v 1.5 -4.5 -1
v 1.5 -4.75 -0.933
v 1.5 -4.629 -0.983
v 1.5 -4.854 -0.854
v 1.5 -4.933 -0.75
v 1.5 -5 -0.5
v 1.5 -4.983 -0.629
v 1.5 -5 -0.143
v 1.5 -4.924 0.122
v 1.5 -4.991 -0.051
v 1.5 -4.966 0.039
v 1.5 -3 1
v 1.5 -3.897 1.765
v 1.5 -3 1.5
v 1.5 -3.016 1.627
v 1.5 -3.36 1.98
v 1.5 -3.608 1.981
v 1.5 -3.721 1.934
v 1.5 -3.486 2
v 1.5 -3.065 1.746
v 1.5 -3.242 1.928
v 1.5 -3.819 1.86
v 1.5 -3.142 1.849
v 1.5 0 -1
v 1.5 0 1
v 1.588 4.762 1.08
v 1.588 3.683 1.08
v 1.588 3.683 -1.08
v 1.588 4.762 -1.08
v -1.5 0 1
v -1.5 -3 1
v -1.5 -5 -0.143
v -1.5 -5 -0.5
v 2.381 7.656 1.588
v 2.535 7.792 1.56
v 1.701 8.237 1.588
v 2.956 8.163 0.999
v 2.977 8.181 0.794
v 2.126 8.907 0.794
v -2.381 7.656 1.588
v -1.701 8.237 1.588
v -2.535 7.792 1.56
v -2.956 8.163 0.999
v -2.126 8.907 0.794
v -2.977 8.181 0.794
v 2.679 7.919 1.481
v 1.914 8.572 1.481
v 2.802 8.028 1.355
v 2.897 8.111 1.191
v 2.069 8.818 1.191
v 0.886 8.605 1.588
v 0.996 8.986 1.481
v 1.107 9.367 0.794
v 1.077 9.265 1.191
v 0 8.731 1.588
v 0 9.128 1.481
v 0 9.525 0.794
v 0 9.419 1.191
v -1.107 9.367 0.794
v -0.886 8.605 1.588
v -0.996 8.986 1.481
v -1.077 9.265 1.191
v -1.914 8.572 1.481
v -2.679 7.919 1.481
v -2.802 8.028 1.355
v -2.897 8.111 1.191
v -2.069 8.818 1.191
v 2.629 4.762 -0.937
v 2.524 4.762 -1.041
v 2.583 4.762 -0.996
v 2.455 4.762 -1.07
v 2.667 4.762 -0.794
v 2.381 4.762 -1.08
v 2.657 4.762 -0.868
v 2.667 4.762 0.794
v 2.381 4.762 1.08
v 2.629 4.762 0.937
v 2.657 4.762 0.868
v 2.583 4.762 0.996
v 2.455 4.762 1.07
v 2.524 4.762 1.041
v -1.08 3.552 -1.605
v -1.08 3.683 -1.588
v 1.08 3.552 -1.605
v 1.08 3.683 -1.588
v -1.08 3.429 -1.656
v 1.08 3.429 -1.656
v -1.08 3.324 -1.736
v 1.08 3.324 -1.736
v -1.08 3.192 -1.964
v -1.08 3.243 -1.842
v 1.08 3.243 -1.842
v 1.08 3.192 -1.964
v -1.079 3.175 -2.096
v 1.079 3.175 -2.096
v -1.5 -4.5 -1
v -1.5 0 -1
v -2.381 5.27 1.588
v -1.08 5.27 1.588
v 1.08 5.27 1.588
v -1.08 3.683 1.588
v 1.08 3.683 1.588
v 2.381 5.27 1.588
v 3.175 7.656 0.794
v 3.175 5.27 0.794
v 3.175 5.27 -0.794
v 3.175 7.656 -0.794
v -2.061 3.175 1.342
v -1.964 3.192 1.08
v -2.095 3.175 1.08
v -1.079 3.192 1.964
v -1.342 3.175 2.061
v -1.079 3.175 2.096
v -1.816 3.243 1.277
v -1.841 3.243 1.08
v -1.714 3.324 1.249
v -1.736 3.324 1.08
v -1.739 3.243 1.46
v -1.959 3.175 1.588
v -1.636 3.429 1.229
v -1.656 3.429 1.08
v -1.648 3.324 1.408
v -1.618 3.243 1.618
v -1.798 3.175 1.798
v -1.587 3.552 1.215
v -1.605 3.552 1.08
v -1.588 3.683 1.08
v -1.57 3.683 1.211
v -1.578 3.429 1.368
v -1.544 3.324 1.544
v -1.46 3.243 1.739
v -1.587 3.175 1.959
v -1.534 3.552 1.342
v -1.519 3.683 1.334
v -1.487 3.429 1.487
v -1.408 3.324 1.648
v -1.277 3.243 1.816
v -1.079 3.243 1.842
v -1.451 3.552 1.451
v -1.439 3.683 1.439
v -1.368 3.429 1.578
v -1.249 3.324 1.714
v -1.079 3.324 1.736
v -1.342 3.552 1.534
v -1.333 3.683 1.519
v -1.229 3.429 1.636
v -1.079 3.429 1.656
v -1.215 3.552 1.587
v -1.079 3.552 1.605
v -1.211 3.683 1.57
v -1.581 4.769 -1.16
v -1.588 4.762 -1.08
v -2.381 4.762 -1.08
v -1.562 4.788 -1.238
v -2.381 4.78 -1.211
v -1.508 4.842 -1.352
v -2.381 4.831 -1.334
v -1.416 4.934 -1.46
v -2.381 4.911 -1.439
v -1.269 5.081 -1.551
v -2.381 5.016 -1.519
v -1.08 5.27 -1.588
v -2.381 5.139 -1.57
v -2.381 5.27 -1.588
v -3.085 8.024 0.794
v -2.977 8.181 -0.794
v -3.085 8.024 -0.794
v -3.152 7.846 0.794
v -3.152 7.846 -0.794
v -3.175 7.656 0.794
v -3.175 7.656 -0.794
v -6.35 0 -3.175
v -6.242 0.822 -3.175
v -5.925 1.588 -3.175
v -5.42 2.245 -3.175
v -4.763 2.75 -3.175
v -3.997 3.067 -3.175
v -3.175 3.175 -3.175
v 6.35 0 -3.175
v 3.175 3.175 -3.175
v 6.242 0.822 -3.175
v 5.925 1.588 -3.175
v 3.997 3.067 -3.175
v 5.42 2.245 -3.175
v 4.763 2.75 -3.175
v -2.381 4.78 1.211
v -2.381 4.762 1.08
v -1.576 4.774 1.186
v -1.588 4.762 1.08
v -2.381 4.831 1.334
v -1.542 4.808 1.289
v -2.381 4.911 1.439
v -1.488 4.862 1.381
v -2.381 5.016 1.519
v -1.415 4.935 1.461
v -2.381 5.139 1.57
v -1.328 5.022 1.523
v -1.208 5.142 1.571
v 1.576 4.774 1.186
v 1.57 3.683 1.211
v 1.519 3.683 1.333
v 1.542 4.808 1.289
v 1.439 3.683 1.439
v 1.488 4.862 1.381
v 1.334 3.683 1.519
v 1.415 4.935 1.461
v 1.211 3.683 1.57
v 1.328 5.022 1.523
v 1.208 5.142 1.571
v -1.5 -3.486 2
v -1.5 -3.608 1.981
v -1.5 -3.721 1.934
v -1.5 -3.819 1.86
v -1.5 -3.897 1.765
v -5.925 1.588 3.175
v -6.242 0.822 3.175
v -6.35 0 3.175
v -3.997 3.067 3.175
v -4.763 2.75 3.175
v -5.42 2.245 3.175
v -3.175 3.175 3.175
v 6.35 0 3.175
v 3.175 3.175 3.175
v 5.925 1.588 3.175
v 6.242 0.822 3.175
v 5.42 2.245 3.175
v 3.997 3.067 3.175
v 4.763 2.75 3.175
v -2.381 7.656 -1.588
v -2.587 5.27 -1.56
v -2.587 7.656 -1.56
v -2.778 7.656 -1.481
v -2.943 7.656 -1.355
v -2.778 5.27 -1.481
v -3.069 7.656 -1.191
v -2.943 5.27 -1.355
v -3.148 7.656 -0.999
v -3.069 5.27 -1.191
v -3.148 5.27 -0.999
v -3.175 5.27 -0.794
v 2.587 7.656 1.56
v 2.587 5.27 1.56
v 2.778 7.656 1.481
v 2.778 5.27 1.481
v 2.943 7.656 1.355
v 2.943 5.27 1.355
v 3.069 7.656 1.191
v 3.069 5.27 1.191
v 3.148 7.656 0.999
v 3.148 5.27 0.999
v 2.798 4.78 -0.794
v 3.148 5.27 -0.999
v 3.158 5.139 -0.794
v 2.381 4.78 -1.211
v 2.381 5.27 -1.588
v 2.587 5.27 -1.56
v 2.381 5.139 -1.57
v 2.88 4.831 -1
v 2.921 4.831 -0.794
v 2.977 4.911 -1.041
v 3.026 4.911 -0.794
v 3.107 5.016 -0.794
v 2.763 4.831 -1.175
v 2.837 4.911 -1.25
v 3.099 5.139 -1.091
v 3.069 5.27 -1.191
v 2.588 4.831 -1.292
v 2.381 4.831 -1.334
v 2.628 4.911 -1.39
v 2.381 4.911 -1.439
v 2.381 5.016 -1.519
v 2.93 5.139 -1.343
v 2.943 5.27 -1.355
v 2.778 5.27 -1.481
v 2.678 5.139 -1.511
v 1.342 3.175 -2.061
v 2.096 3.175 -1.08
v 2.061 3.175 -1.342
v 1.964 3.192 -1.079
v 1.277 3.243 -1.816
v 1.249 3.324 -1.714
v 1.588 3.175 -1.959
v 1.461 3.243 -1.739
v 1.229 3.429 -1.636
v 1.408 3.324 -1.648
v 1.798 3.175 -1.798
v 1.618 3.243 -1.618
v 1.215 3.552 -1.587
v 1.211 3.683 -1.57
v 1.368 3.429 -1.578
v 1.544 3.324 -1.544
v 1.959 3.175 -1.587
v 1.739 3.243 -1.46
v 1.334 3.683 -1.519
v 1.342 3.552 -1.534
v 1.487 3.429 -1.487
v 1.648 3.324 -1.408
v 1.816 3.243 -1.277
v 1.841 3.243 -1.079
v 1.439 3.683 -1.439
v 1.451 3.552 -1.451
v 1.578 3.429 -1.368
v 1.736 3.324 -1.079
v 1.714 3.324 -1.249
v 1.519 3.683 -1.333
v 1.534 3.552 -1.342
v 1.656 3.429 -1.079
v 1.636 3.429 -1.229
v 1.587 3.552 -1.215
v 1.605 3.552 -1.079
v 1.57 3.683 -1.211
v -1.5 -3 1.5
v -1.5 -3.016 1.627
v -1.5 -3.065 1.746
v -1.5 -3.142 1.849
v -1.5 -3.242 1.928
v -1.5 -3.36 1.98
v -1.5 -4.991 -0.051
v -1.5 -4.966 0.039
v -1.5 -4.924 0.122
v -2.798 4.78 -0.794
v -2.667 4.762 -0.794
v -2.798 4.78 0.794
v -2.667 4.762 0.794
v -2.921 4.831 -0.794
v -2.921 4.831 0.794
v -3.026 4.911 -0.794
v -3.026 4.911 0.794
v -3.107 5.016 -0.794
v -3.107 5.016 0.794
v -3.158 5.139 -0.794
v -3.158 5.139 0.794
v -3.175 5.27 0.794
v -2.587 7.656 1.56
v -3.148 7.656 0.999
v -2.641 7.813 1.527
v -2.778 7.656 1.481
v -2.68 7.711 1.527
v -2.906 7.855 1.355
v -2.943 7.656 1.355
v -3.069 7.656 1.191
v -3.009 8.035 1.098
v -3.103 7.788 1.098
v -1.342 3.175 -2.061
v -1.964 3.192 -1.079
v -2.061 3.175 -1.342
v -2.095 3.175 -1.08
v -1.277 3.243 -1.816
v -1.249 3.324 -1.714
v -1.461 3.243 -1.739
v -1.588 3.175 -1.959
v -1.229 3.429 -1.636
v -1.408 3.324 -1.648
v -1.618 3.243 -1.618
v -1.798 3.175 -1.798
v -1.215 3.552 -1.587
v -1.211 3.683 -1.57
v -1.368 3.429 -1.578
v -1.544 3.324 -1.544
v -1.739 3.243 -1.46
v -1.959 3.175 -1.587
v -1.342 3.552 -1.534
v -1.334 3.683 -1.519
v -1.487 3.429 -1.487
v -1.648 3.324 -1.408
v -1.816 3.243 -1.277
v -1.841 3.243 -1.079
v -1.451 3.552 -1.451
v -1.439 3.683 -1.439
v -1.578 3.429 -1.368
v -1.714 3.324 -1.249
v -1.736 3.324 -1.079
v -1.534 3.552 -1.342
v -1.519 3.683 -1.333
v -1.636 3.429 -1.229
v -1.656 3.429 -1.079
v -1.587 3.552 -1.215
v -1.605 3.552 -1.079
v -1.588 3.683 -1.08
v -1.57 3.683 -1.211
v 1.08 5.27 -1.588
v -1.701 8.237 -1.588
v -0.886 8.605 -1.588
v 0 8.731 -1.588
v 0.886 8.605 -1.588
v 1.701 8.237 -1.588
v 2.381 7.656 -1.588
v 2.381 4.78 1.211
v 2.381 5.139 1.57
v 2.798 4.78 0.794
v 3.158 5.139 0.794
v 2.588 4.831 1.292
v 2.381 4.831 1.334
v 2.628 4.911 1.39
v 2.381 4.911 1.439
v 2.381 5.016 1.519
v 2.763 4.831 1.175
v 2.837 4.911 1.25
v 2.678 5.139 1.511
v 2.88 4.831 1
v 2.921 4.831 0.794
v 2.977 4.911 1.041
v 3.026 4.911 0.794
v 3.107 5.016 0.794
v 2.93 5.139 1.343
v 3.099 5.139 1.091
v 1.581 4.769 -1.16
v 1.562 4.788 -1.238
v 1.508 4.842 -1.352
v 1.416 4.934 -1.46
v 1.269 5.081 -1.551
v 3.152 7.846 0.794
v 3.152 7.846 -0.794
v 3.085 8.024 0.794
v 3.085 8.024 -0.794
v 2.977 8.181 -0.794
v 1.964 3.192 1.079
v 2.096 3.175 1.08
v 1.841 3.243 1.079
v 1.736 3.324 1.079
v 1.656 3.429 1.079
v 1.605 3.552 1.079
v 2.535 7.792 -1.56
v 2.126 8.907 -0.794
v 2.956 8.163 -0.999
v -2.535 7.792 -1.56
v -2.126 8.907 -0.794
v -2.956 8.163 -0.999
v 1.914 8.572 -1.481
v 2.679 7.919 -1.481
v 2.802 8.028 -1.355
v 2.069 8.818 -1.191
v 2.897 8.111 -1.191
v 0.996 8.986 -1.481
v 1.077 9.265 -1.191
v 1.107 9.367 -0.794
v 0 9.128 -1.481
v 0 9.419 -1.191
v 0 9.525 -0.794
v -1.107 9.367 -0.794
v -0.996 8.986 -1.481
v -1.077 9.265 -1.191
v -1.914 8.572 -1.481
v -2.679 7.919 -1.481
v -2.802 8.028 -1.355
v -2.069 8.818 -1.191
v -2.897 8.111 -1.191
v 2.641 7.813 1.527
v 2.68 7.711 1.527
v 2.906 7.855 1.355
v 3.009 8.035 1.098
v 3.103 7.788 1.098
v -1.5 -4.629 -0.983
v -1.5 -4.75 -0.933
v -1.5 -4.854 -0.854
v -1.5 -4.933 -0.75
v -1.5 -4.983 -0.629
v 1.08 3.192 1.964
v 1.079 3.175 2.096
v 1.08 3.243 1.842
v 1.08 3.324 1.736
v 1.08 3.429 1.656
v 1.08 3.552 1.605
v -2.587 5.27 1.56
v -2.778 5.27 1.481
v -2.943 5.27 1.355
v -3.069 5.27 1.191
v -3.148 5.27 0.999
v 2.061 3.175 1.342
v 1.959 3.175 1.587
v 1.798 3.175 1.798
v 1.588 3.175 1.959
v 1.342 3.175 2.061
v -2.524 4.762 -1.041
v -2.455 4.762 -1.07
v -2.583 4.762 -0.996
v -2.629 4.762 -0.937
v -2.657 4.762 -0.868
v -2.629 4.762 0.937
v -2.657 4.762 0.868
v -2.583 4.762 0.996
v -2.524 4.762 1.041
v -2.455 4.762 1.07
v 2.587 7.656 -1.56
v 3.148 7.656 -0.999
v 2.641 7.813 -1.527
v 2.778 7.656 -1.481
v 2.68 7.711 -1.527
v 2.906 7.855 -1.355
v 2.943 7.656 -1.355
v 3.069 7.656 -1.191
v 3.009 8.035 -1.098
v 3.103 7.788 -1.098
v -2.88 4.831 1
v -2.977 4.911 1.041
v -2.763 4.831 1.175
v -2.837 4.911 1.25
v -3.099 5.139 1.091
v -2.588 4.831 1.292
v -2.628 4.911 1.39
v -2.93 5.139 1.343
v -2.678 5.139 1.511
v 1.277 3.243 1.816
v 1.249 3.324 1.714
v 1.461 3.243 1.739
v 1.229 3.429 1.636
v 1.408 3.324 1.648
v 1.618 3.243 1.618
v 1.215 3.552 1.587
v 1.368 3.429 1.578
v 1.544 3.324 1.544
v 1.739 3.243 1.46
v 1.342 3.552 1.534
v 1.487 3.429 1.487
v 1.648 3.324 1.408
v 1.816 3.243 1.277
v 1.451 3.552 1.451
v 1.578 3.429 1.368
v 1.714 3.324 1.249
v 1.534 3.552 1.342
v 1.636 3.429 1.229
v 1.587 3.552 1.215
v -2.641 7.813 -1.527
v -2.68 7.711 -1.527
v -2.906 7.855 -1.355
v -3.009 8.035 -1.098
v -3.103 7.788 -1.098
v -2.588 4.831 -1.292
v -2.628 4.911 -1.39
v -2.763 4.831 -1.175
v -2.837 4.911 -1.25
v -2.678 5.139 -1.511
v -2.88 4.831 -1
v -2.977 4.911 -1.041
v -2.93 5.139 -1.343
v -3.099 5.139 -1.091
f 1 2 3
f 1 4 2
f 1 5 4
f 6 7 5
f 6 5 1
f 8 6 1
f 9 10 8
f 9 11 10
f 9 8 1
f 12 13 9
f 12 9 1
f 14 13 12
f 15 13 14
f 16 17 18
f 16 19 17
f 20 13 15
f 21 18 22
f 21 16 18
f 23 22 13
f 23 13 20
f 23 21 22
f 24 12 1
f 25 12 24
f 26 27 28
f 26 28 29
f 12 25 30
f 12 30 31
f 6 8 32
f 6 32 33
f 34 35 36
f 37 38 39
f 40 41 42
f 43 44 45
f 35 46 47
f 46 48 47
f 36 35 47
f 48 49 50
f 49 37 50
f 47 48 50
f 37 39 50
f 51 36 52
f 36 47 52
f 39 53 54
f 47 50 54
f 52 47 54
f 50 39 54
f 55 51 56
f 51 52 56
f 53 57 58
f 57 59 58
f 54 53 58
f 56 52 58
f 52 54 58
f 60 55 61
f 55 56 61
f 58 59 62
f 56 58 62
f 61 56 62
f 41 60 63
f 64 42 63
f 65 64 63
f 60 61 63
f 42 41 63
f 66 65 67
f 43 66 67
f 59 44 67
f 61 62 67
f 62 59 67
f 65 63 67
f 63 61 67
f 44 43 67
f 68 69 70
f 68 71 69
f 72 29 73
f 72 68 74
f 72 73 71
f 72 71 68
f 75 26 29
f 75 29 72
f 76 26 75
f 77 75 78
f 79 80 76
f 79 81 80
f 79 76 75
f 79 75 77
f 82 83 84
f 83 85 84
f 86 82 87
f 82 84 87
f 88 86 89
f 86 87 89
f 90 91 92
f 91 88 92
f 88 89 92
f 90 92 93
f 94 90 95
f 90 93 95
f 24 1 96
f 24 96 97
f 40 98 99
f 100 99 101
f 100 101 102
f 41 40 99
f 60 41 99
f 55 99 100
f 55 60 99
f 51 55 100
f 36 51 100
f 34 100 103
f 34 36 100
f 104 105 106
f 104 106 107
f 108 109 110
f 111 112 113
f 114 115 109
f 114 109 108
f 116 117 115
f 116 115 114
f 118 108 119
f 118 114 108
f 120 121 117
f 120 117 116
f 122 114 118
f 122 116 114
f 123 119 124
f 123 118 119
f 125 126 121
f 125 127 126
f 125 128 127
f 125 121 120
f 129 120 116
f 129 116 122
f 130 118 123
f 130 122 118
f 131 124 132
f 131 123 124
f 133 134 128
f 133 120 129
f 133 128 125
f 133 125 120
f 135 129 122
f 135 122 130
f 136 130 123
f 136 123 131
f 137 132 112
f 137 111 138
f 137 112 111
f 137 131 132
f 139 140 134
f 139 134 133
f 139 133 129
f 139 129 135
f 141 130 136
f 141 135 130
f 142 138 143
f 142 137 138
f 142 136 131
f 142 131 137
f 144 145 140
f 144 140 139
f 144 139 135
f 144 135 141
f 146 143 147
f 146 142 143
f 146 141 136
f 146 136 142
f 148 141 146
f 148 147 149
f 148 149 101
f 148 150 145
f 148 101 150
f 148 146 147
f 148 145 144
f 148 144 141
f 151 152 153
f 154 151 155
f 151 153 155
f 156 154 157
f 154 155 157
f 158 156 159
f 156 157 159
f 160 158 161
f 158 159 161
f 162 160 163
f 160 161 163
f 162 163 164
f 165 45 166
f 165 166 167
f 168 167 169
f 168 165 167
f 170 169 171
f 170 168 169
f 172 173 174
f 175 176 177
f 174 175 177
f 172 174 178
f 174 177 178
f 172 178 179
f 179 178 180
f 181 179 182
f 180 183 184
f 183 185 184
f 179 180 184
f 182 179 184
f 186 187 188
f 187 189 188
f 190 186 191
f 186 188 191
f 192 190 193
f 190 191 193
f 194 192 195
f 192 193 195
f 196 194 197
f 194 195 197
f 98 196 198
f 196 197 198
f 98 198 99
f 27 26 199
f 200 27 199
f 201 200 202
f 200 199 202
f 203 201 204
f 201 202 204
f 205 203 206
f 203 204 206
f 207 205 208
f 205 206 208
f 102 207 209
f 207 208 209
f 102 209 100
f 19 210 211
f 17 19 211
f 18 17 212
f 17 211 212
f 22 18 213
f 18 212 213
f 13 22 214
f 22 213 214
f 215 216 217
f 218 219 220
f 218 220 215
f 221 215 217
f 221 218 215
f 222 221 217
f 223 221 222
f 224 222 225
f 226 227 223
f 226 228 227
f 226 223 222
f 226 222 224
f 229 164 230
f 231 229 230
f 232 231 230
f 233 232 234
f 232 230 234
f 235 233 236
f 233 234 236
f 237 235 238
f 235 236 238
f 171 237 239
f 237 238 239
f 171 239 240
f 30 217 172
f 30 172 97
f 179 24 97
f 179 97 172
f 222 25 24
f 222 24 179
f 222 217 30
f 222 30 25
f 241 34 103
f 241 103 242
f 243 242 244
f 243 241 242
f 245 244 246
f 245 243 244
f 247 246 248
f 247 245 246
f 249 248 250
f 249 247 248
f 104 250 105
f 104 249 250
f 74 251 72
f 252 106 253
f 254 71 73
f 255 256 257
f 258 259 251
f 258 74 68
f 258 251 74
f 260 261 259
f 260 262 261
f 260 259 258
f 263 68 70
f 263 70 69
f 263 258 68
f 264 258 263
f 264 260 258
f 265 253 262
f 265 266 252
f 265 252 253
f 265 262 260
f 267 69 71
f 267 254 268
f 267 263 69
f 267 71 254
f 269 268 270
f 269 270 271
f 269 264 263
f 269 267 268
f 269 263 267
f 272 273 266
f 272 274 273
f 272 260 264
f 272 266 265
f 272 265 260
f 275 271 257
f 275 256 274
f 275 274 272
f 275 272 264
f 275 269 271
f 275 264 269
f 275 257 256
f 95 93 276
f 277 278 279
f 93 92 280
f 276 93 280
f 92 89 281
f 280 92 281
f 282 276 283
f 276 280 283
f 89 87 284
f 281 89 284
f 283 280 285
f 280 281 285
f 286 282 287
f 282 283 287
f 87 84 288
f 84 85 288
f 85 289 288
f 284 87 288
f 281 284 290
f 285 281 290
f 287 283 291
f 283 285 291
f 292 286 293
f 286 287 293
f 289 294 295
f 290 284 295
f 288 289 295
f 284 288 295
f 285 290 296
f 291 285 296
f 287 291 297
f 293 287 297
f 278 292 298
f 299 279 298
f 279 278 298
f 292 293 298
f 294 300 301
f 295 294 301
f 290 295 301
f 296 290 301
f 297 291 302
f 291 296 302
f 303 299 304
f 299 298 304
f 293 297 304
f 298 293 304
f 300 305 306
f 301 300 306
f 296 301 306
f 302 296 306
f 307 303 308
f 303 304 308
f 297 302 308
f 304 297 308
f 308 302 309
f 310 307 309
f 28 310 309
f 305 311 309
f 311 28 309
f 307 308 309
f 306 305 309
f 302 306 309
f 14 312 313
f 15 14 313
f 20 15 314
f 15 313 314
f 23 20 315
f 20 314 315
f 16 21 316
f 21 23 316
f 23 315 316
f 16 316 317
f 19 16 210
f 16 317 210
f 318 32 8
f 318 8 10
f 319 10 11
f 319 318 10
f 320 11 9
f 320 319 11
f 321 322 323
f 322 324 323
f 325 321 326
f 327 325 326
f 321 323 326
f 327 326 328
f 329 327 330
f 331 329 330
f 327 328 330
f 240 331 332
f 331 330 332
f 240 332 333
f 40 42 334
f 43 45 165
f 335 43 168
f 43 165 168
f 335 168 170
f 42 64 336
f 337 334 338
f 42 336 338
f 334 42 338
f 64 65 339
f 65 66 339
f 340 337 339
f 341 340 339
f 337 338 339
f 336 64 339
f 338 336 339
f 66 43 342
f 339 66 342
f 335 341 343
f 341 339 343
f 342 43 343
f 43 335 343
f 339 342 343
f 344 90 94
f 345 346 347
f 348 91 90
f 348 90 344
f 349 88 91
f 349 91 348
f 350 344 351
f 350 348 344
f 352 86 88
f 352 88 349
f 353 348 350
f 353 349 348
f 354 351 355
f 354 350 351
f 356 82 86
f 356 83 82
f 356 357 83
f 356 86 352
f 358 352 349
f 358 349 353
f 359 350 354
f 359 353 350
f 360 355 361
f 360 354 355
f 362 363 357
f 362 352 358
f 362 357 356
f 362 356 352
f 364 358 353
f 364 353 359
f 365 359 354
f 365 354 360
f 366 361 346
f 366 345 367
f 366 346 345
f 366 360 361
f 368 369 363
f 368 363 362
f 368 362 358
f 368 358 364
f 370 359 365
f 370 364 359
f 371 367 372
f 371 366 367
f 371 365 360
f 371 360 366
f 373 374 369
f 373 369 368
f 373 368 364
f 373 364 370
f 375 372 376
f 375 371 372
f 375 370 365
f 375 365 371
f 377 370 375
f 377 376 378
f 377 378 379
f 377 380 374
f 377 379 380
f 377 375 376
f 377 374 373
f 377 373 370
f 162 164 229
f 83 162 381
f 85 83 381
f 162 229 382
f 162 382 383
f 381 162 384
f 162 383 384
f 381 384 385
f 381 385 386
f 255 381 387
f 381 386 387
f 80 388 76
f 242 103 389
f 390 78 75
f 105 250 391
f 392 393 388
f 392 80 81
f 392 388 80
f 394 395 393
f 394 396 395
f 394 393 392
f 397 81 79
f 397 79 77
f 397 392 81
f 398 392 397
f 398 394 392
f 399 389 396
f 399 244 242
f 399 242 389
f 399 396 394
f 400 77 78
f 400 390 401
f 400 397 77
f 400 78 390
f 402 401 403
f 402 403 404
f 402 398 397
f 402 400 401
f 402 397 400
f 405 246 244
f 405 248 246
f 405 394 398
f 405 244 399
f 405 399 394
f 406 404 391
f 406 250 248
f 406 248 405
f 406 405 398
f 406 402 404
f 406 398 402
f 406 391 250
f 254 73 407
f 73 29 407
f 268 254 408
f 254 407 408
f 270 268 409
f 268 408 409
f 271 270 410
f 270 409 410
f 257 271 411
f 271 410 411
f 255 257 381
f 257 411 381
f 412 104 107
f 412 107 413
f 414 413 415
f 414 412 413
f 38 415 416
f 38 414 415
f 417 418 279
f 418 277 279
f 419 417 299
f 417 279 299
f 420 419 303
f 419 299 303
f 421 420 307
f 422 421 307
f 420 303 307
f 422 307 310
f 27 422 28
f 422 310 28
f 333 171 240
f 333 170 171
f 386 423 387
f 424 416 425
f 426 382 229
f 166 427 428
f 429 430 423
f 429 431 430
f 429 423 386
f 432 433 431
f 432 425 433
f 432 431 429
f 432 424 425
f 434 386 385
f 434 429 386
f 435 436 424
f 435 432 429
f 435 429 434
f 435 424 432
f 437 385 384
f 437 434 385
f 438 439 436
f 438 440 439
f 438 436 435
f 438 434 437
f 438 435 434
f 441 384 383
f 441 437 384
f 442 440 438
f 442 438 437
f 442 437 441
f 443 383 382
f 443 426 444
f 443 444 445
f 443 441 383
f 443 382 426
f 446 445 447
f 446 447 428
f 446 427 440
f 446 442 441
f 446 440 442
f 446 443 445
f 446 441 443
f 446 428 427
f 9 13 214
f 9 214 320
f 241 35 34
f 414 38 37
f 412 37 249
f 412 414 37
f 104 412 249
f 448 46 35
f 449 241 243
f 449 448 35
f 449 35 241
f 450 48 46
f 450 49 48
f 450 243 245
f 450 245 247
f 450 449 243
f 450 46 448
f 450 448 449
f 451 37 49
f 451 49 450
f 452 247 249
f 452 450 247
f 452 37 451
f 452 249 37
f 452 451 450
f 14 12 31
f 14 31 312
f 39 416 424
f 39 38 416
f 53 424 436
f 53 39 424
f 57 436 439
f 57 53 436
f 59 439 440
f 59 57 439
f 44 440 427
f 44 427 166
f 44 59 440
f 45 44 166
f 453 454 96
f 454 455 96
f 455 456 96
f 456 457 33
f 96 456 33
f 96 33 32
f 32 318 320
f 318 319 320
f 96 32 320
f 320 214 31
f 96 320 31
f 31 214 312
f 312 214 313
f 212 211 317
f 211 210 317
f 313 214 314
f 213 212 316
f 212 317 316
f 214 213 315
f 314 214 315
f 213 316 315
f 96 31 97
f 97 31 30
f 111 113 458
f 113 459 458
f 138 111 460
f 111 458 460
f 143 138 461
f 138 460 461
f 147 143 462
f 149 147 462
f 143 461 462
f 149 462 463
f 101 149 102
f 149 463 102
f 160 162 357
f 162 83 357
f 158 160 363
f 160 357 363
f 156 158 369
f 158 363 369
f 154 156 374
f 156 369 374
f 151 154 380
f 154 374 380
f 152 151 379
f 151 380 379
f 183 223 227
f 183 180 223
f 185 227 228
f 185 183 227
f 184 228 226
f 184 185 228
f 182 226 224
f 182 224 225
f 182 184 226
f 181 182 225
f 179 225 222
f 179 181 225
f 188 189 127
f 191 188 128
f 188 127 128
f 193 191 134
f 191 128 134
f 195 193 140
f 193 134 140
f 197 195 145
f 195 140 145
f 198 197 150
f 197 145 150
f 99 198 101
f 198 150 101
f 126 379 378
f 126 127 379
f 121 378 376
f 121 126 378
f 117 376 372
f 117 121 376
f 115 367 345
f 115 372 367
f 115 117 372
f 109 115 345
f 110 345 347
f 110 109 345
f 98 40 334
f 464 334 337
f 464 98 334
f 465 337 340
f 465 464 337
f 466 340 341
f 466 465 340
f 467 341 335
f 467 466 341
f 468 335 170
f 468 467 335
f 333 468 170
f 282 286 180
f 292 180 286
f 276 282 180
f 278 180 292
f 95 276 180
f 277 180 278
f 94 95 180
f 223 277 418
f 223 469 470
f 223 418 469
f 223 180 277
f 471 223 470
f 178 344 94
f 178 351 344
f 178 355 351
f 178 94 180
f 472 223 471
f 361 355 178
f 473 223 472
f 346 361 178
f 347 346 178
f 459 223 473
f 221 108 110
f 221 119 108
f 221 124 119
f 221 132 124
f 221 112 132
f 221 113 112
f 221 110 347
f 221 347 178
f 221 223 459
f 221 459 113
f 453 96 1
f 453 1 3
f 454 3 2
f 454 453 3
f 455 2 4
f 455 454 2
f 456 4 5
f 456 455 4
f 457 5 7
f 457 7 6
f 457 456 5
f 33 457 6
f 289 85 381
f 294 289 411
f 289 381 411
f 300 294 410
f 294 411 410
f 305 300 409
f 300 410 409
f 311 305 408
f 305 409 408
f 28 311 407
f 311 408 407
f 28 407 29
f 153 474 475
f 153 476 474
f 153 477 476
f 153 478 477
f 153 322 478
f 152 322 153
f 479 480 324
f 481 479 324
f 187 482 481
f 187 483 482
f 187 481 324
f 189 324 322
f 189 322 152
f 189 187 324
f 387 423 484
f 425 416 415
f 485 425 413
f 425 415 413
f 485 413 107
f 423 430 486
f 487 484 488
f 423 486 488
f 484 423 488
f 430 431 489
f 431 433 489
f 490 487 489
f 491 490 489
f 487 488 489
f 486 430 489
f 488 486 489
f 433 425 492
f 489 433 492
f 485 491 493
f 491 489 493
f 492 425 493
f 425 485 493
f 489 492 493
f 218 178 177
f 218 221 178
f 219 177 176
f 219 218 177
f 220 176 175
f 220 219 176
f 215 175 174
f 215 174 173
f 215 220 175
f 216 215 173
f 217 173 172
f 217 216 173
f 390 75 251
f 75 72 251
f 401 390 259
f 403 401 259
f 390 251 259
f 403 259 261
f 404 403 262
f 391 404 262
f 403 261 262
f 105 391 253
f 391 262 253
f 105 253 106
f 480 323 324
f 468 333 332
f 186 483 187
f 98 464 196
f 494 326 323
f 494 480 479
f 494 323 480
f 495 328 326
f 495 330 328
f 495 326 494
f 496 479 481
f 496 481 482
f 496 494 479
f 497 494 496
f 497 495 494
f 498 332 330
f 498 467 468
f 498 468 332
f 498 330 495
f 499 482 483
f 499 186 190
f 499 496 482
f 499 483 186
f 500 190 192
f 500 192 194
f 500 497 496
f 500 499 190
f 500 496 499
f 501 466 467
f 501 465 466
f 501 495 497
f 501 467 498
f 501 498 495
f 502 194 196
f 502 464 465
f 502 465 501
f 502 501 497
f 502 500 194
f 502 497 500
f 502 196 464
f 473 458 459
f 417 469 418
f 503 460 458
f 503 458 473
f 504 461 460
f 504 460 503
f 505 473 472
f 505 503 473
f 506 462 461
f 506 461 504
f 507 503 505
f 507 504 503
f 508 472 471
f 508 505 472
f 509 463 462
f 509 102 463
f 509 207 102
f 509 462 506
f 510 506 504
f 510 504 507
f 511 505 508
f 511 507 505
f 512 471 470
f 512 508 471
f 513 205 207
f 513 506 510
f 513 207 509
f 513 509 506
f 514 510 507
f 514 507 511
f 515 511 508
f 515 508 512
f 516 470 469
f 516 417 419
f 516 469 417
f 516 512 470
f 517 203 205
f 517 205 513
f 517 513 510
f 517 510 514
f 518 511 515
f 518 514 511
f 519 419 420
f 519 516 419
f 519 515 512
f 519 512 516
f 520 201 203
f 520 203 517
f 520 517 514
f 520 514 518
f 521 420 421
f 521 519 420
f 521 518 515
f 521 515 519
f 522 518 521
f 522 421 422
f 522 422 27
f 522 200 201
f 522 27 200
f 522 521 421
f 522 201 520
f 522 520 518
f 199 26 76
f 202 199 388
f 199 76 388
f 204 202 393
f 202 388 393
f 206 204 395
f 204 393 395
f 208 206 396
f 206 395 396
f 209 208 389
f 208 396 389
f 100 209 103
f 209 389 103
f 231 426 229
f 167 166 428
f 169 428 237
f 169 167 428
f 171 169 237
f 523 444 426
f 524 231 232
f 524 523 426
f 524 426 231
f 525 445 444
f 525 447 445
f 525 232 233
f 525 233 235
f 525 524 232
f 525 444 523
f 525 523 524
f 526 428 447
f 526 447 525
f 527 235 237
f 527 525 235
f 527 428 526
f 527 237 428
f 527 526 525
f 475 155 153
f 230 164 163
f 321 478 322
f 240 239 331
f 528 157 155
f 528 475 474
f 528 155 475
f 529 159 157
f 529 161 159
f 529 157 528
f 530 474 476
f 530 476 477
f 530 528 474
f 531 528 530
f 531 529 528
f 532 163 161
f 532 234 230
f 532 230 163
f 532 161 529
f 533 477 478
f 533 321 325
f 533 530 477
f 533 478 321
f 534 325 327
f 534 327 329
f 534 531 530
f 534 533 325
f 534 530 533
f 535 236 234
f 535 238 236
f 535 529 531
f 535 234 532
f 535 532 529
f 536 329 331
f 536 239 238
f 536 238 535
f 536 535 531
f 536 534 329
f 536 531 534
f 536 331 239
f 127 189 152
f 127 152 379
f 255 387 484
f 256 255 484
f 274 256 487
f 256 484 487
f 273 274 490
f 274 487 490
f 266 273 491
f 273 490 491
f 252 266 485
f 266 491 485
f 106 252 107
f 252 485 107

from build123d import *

# Parameters (mm, degrees)
F1_DEPTH    = 1.5875
F2_DEPTH    = 3.175
F3_R        = 3.17499
F4_R        = 0.79375
F5_R        = 0.508
F7_DEPTH    = 1.5
F8_T1_DEPTH = 5.5
F8_T3_DEPTH = 3.716990566
F8_T5_DEPTH = 4.3856191038


# Not quite as in the source:
# - a fillet or chamfer that OpenCascade refuses, or shapes differently, is made with other operations: its cross-section is extruded or revolved along the edge and cut away or added
# - a fillet or chamfer is up to 0.001 mm smaller than in the source, because OpenCascade refuses the exact size


with BuildPart() as f1:
    # F0 (on Top) → F1 (new body, symmetric)
    with BuildSketch(Plane.XY):
        with BuildLine():
            Line((3.175, 4.7625), (3.175, 7.9375))
            ThreePointArc((3.175, 7.9375), (0, 9.525), (-3.175, 7.9375))
            Line((-3.175, 7.9375), (-3.175, 4.7625))
            Line((-3.175, 4.7625), (-1.5875, 4.7625))
            Line((-1.5875, 4.7625), (-1.5875, 3.175))
            Line((-1.5875, 3.175), (1.5875, 3.175))
            Line((1.5875, 3.175), (1.5875, 4.7625))
            Line((1.5875, 4.7625), (3.175, 4.7625))
        make_face()
    extrude(amount=F1_DEPTH, both=True)

    # F0 (on Top) → F2 (join, symmetric)
    with BuildSketch(Plane.XY):
        Polygon((6.35, 3.175), (1.5875, 3.175), (-1.5875, 3.175), (-6.35, 3.175), (-6.35, 0), (6.35, 0), align=None)
    extrude(amount=F2_DEPTH, both=True)

    # F3 (radius 3.175 in the source; OpenCascade refuses exactly that, so slightly less here)
    f3_edges = [f1.edges().sort_by_distance(p)[0] for p in [
        (6.35, 3.175, 0),
        (-6.35, 3.175, 0),
    ]]
    fillet(f3_edges, radius=F3_R)

    # F4
    f4_edges = [f1.edges().sort_by_distance(p)[0] for p in [
        (0, 9.525, -1.5875),
        (0, 9.525, 1.5875),
        (3.175, 6.35, -1.5875),
        (3.175, 6.35, 1.5875),
        (-3.175, 6.35, -1.5875),
        (-3.175, 6.35, 1.5875),
        (3.175, 7.9375, 0),
        (-3.175, 7.9375, 0),
    ]]
    fillet(f4_edges, radius=F4_R)

    # F5
    f5_edges = [f1.edges().sort_by_distance(p)[0] for p in [
        (0, 3.175, -1.5875),
        (-1.5875, 3.175, 0),
        (0, 3.175, 1.5875),
        (1.5875, 3.175, 0),
        (1.5875, 3.96875, 1.5875),
        (1.5875, 3.96875, -1.5875),
        (-1.5875, 3.96875, -1.5875),
        (-1.5875, 3.96875, 1.5875),
        (2.942516, 4.7625, 1.355016),
        (-2.942516, 4.7625, -1.355016),
        (1.984375, 4.7625, -1.5875),
        (-1.984375, 4.7625, -1.5875),
        (2.942516, 4.7625, -1.355016),
        (3.175, 4.7625, 0),
        (1.984375, 4.7625, 1.5875),
        (-3.175, 4.7625, 0),
        (-2.942516, 4.7625, 1.355016),
        (-1.984375, 4.7625, 1.5875),
    ]]
    fillet(f5_edges, radius=F5_R)

    # F6 (on Right) → F7 (join, symmetric)
    with BuildSketch(Plane.YZ):
        Polygon((0, -1), (0, 1), (-3, 1), (-3, 2), (-3.75, 2), (-5, 0), (-5, -1), align=None)
    extrude(amount=F7_DEPTH, both=True)

    # F8: fillet of radius 0.5 on 4 edges, made by hand

    # F8_s2 → F8_t1 (cut)
    with BuildSketch(Plane.YZ.offset(-2.75)):
        with BuildLine():
            ThreePointArc((-4.5, -1), (-4.8535533906, -0.8535533906), (-5, -0.5))
            Line((-5, -0.5), (-5, -1))
            Line((-5, -1), (-4.5, -1))
        make_face()
        with BuildLine():
            ThreePointArc((-3, 1.5), (-3.1464466094, 1.8535533906), (-3.5, 2))
            Line((-3.5, 2), (-3, 2))
            Line((-3, 2), (-3, 1.5))
        make_face()
    extrude(amount=F8_T1_DEPTH, mode=Mode.SUBTRACT)

    # F8_s4 → F8_t3 (cut)
    with BuildSketch(Plane.YZ.offset(-1.858495283)):
        with BuildLine():
            ThreePointArc((-5, -0.1433981132), (-4.9806243731, -0.0055568567), (-4.923999152, 0.1216013568))
            Line((-4.923999152, 0.1216013568), (-5, 0))
            Line((-5, 0), (-5, -0.1433981132))
        make_face()
    extrude(amount=F8_T3_DEPTH, mode=Mode.SUBTRACT)

    # F8_s6 → F8_t5 (cut)
    with BuildSketch(Plane.YZ.offset(-2.1928095519)):
        with BuildLine():
            ThreePointArc((-3.4728761792, 2), (-3.7152604454, 1.9373212406), (-3.8968753312, 1.76499947))
            Line((-3.8968753312, 1.76499947), (-3.75, 2))
            Line((-3.75, 2), (-3.4728761792, 2))
        make_face()
    extrude(amount=F8_T5_DEPTH, mode=Mode.SUBTRACT)


solid = f1.part
